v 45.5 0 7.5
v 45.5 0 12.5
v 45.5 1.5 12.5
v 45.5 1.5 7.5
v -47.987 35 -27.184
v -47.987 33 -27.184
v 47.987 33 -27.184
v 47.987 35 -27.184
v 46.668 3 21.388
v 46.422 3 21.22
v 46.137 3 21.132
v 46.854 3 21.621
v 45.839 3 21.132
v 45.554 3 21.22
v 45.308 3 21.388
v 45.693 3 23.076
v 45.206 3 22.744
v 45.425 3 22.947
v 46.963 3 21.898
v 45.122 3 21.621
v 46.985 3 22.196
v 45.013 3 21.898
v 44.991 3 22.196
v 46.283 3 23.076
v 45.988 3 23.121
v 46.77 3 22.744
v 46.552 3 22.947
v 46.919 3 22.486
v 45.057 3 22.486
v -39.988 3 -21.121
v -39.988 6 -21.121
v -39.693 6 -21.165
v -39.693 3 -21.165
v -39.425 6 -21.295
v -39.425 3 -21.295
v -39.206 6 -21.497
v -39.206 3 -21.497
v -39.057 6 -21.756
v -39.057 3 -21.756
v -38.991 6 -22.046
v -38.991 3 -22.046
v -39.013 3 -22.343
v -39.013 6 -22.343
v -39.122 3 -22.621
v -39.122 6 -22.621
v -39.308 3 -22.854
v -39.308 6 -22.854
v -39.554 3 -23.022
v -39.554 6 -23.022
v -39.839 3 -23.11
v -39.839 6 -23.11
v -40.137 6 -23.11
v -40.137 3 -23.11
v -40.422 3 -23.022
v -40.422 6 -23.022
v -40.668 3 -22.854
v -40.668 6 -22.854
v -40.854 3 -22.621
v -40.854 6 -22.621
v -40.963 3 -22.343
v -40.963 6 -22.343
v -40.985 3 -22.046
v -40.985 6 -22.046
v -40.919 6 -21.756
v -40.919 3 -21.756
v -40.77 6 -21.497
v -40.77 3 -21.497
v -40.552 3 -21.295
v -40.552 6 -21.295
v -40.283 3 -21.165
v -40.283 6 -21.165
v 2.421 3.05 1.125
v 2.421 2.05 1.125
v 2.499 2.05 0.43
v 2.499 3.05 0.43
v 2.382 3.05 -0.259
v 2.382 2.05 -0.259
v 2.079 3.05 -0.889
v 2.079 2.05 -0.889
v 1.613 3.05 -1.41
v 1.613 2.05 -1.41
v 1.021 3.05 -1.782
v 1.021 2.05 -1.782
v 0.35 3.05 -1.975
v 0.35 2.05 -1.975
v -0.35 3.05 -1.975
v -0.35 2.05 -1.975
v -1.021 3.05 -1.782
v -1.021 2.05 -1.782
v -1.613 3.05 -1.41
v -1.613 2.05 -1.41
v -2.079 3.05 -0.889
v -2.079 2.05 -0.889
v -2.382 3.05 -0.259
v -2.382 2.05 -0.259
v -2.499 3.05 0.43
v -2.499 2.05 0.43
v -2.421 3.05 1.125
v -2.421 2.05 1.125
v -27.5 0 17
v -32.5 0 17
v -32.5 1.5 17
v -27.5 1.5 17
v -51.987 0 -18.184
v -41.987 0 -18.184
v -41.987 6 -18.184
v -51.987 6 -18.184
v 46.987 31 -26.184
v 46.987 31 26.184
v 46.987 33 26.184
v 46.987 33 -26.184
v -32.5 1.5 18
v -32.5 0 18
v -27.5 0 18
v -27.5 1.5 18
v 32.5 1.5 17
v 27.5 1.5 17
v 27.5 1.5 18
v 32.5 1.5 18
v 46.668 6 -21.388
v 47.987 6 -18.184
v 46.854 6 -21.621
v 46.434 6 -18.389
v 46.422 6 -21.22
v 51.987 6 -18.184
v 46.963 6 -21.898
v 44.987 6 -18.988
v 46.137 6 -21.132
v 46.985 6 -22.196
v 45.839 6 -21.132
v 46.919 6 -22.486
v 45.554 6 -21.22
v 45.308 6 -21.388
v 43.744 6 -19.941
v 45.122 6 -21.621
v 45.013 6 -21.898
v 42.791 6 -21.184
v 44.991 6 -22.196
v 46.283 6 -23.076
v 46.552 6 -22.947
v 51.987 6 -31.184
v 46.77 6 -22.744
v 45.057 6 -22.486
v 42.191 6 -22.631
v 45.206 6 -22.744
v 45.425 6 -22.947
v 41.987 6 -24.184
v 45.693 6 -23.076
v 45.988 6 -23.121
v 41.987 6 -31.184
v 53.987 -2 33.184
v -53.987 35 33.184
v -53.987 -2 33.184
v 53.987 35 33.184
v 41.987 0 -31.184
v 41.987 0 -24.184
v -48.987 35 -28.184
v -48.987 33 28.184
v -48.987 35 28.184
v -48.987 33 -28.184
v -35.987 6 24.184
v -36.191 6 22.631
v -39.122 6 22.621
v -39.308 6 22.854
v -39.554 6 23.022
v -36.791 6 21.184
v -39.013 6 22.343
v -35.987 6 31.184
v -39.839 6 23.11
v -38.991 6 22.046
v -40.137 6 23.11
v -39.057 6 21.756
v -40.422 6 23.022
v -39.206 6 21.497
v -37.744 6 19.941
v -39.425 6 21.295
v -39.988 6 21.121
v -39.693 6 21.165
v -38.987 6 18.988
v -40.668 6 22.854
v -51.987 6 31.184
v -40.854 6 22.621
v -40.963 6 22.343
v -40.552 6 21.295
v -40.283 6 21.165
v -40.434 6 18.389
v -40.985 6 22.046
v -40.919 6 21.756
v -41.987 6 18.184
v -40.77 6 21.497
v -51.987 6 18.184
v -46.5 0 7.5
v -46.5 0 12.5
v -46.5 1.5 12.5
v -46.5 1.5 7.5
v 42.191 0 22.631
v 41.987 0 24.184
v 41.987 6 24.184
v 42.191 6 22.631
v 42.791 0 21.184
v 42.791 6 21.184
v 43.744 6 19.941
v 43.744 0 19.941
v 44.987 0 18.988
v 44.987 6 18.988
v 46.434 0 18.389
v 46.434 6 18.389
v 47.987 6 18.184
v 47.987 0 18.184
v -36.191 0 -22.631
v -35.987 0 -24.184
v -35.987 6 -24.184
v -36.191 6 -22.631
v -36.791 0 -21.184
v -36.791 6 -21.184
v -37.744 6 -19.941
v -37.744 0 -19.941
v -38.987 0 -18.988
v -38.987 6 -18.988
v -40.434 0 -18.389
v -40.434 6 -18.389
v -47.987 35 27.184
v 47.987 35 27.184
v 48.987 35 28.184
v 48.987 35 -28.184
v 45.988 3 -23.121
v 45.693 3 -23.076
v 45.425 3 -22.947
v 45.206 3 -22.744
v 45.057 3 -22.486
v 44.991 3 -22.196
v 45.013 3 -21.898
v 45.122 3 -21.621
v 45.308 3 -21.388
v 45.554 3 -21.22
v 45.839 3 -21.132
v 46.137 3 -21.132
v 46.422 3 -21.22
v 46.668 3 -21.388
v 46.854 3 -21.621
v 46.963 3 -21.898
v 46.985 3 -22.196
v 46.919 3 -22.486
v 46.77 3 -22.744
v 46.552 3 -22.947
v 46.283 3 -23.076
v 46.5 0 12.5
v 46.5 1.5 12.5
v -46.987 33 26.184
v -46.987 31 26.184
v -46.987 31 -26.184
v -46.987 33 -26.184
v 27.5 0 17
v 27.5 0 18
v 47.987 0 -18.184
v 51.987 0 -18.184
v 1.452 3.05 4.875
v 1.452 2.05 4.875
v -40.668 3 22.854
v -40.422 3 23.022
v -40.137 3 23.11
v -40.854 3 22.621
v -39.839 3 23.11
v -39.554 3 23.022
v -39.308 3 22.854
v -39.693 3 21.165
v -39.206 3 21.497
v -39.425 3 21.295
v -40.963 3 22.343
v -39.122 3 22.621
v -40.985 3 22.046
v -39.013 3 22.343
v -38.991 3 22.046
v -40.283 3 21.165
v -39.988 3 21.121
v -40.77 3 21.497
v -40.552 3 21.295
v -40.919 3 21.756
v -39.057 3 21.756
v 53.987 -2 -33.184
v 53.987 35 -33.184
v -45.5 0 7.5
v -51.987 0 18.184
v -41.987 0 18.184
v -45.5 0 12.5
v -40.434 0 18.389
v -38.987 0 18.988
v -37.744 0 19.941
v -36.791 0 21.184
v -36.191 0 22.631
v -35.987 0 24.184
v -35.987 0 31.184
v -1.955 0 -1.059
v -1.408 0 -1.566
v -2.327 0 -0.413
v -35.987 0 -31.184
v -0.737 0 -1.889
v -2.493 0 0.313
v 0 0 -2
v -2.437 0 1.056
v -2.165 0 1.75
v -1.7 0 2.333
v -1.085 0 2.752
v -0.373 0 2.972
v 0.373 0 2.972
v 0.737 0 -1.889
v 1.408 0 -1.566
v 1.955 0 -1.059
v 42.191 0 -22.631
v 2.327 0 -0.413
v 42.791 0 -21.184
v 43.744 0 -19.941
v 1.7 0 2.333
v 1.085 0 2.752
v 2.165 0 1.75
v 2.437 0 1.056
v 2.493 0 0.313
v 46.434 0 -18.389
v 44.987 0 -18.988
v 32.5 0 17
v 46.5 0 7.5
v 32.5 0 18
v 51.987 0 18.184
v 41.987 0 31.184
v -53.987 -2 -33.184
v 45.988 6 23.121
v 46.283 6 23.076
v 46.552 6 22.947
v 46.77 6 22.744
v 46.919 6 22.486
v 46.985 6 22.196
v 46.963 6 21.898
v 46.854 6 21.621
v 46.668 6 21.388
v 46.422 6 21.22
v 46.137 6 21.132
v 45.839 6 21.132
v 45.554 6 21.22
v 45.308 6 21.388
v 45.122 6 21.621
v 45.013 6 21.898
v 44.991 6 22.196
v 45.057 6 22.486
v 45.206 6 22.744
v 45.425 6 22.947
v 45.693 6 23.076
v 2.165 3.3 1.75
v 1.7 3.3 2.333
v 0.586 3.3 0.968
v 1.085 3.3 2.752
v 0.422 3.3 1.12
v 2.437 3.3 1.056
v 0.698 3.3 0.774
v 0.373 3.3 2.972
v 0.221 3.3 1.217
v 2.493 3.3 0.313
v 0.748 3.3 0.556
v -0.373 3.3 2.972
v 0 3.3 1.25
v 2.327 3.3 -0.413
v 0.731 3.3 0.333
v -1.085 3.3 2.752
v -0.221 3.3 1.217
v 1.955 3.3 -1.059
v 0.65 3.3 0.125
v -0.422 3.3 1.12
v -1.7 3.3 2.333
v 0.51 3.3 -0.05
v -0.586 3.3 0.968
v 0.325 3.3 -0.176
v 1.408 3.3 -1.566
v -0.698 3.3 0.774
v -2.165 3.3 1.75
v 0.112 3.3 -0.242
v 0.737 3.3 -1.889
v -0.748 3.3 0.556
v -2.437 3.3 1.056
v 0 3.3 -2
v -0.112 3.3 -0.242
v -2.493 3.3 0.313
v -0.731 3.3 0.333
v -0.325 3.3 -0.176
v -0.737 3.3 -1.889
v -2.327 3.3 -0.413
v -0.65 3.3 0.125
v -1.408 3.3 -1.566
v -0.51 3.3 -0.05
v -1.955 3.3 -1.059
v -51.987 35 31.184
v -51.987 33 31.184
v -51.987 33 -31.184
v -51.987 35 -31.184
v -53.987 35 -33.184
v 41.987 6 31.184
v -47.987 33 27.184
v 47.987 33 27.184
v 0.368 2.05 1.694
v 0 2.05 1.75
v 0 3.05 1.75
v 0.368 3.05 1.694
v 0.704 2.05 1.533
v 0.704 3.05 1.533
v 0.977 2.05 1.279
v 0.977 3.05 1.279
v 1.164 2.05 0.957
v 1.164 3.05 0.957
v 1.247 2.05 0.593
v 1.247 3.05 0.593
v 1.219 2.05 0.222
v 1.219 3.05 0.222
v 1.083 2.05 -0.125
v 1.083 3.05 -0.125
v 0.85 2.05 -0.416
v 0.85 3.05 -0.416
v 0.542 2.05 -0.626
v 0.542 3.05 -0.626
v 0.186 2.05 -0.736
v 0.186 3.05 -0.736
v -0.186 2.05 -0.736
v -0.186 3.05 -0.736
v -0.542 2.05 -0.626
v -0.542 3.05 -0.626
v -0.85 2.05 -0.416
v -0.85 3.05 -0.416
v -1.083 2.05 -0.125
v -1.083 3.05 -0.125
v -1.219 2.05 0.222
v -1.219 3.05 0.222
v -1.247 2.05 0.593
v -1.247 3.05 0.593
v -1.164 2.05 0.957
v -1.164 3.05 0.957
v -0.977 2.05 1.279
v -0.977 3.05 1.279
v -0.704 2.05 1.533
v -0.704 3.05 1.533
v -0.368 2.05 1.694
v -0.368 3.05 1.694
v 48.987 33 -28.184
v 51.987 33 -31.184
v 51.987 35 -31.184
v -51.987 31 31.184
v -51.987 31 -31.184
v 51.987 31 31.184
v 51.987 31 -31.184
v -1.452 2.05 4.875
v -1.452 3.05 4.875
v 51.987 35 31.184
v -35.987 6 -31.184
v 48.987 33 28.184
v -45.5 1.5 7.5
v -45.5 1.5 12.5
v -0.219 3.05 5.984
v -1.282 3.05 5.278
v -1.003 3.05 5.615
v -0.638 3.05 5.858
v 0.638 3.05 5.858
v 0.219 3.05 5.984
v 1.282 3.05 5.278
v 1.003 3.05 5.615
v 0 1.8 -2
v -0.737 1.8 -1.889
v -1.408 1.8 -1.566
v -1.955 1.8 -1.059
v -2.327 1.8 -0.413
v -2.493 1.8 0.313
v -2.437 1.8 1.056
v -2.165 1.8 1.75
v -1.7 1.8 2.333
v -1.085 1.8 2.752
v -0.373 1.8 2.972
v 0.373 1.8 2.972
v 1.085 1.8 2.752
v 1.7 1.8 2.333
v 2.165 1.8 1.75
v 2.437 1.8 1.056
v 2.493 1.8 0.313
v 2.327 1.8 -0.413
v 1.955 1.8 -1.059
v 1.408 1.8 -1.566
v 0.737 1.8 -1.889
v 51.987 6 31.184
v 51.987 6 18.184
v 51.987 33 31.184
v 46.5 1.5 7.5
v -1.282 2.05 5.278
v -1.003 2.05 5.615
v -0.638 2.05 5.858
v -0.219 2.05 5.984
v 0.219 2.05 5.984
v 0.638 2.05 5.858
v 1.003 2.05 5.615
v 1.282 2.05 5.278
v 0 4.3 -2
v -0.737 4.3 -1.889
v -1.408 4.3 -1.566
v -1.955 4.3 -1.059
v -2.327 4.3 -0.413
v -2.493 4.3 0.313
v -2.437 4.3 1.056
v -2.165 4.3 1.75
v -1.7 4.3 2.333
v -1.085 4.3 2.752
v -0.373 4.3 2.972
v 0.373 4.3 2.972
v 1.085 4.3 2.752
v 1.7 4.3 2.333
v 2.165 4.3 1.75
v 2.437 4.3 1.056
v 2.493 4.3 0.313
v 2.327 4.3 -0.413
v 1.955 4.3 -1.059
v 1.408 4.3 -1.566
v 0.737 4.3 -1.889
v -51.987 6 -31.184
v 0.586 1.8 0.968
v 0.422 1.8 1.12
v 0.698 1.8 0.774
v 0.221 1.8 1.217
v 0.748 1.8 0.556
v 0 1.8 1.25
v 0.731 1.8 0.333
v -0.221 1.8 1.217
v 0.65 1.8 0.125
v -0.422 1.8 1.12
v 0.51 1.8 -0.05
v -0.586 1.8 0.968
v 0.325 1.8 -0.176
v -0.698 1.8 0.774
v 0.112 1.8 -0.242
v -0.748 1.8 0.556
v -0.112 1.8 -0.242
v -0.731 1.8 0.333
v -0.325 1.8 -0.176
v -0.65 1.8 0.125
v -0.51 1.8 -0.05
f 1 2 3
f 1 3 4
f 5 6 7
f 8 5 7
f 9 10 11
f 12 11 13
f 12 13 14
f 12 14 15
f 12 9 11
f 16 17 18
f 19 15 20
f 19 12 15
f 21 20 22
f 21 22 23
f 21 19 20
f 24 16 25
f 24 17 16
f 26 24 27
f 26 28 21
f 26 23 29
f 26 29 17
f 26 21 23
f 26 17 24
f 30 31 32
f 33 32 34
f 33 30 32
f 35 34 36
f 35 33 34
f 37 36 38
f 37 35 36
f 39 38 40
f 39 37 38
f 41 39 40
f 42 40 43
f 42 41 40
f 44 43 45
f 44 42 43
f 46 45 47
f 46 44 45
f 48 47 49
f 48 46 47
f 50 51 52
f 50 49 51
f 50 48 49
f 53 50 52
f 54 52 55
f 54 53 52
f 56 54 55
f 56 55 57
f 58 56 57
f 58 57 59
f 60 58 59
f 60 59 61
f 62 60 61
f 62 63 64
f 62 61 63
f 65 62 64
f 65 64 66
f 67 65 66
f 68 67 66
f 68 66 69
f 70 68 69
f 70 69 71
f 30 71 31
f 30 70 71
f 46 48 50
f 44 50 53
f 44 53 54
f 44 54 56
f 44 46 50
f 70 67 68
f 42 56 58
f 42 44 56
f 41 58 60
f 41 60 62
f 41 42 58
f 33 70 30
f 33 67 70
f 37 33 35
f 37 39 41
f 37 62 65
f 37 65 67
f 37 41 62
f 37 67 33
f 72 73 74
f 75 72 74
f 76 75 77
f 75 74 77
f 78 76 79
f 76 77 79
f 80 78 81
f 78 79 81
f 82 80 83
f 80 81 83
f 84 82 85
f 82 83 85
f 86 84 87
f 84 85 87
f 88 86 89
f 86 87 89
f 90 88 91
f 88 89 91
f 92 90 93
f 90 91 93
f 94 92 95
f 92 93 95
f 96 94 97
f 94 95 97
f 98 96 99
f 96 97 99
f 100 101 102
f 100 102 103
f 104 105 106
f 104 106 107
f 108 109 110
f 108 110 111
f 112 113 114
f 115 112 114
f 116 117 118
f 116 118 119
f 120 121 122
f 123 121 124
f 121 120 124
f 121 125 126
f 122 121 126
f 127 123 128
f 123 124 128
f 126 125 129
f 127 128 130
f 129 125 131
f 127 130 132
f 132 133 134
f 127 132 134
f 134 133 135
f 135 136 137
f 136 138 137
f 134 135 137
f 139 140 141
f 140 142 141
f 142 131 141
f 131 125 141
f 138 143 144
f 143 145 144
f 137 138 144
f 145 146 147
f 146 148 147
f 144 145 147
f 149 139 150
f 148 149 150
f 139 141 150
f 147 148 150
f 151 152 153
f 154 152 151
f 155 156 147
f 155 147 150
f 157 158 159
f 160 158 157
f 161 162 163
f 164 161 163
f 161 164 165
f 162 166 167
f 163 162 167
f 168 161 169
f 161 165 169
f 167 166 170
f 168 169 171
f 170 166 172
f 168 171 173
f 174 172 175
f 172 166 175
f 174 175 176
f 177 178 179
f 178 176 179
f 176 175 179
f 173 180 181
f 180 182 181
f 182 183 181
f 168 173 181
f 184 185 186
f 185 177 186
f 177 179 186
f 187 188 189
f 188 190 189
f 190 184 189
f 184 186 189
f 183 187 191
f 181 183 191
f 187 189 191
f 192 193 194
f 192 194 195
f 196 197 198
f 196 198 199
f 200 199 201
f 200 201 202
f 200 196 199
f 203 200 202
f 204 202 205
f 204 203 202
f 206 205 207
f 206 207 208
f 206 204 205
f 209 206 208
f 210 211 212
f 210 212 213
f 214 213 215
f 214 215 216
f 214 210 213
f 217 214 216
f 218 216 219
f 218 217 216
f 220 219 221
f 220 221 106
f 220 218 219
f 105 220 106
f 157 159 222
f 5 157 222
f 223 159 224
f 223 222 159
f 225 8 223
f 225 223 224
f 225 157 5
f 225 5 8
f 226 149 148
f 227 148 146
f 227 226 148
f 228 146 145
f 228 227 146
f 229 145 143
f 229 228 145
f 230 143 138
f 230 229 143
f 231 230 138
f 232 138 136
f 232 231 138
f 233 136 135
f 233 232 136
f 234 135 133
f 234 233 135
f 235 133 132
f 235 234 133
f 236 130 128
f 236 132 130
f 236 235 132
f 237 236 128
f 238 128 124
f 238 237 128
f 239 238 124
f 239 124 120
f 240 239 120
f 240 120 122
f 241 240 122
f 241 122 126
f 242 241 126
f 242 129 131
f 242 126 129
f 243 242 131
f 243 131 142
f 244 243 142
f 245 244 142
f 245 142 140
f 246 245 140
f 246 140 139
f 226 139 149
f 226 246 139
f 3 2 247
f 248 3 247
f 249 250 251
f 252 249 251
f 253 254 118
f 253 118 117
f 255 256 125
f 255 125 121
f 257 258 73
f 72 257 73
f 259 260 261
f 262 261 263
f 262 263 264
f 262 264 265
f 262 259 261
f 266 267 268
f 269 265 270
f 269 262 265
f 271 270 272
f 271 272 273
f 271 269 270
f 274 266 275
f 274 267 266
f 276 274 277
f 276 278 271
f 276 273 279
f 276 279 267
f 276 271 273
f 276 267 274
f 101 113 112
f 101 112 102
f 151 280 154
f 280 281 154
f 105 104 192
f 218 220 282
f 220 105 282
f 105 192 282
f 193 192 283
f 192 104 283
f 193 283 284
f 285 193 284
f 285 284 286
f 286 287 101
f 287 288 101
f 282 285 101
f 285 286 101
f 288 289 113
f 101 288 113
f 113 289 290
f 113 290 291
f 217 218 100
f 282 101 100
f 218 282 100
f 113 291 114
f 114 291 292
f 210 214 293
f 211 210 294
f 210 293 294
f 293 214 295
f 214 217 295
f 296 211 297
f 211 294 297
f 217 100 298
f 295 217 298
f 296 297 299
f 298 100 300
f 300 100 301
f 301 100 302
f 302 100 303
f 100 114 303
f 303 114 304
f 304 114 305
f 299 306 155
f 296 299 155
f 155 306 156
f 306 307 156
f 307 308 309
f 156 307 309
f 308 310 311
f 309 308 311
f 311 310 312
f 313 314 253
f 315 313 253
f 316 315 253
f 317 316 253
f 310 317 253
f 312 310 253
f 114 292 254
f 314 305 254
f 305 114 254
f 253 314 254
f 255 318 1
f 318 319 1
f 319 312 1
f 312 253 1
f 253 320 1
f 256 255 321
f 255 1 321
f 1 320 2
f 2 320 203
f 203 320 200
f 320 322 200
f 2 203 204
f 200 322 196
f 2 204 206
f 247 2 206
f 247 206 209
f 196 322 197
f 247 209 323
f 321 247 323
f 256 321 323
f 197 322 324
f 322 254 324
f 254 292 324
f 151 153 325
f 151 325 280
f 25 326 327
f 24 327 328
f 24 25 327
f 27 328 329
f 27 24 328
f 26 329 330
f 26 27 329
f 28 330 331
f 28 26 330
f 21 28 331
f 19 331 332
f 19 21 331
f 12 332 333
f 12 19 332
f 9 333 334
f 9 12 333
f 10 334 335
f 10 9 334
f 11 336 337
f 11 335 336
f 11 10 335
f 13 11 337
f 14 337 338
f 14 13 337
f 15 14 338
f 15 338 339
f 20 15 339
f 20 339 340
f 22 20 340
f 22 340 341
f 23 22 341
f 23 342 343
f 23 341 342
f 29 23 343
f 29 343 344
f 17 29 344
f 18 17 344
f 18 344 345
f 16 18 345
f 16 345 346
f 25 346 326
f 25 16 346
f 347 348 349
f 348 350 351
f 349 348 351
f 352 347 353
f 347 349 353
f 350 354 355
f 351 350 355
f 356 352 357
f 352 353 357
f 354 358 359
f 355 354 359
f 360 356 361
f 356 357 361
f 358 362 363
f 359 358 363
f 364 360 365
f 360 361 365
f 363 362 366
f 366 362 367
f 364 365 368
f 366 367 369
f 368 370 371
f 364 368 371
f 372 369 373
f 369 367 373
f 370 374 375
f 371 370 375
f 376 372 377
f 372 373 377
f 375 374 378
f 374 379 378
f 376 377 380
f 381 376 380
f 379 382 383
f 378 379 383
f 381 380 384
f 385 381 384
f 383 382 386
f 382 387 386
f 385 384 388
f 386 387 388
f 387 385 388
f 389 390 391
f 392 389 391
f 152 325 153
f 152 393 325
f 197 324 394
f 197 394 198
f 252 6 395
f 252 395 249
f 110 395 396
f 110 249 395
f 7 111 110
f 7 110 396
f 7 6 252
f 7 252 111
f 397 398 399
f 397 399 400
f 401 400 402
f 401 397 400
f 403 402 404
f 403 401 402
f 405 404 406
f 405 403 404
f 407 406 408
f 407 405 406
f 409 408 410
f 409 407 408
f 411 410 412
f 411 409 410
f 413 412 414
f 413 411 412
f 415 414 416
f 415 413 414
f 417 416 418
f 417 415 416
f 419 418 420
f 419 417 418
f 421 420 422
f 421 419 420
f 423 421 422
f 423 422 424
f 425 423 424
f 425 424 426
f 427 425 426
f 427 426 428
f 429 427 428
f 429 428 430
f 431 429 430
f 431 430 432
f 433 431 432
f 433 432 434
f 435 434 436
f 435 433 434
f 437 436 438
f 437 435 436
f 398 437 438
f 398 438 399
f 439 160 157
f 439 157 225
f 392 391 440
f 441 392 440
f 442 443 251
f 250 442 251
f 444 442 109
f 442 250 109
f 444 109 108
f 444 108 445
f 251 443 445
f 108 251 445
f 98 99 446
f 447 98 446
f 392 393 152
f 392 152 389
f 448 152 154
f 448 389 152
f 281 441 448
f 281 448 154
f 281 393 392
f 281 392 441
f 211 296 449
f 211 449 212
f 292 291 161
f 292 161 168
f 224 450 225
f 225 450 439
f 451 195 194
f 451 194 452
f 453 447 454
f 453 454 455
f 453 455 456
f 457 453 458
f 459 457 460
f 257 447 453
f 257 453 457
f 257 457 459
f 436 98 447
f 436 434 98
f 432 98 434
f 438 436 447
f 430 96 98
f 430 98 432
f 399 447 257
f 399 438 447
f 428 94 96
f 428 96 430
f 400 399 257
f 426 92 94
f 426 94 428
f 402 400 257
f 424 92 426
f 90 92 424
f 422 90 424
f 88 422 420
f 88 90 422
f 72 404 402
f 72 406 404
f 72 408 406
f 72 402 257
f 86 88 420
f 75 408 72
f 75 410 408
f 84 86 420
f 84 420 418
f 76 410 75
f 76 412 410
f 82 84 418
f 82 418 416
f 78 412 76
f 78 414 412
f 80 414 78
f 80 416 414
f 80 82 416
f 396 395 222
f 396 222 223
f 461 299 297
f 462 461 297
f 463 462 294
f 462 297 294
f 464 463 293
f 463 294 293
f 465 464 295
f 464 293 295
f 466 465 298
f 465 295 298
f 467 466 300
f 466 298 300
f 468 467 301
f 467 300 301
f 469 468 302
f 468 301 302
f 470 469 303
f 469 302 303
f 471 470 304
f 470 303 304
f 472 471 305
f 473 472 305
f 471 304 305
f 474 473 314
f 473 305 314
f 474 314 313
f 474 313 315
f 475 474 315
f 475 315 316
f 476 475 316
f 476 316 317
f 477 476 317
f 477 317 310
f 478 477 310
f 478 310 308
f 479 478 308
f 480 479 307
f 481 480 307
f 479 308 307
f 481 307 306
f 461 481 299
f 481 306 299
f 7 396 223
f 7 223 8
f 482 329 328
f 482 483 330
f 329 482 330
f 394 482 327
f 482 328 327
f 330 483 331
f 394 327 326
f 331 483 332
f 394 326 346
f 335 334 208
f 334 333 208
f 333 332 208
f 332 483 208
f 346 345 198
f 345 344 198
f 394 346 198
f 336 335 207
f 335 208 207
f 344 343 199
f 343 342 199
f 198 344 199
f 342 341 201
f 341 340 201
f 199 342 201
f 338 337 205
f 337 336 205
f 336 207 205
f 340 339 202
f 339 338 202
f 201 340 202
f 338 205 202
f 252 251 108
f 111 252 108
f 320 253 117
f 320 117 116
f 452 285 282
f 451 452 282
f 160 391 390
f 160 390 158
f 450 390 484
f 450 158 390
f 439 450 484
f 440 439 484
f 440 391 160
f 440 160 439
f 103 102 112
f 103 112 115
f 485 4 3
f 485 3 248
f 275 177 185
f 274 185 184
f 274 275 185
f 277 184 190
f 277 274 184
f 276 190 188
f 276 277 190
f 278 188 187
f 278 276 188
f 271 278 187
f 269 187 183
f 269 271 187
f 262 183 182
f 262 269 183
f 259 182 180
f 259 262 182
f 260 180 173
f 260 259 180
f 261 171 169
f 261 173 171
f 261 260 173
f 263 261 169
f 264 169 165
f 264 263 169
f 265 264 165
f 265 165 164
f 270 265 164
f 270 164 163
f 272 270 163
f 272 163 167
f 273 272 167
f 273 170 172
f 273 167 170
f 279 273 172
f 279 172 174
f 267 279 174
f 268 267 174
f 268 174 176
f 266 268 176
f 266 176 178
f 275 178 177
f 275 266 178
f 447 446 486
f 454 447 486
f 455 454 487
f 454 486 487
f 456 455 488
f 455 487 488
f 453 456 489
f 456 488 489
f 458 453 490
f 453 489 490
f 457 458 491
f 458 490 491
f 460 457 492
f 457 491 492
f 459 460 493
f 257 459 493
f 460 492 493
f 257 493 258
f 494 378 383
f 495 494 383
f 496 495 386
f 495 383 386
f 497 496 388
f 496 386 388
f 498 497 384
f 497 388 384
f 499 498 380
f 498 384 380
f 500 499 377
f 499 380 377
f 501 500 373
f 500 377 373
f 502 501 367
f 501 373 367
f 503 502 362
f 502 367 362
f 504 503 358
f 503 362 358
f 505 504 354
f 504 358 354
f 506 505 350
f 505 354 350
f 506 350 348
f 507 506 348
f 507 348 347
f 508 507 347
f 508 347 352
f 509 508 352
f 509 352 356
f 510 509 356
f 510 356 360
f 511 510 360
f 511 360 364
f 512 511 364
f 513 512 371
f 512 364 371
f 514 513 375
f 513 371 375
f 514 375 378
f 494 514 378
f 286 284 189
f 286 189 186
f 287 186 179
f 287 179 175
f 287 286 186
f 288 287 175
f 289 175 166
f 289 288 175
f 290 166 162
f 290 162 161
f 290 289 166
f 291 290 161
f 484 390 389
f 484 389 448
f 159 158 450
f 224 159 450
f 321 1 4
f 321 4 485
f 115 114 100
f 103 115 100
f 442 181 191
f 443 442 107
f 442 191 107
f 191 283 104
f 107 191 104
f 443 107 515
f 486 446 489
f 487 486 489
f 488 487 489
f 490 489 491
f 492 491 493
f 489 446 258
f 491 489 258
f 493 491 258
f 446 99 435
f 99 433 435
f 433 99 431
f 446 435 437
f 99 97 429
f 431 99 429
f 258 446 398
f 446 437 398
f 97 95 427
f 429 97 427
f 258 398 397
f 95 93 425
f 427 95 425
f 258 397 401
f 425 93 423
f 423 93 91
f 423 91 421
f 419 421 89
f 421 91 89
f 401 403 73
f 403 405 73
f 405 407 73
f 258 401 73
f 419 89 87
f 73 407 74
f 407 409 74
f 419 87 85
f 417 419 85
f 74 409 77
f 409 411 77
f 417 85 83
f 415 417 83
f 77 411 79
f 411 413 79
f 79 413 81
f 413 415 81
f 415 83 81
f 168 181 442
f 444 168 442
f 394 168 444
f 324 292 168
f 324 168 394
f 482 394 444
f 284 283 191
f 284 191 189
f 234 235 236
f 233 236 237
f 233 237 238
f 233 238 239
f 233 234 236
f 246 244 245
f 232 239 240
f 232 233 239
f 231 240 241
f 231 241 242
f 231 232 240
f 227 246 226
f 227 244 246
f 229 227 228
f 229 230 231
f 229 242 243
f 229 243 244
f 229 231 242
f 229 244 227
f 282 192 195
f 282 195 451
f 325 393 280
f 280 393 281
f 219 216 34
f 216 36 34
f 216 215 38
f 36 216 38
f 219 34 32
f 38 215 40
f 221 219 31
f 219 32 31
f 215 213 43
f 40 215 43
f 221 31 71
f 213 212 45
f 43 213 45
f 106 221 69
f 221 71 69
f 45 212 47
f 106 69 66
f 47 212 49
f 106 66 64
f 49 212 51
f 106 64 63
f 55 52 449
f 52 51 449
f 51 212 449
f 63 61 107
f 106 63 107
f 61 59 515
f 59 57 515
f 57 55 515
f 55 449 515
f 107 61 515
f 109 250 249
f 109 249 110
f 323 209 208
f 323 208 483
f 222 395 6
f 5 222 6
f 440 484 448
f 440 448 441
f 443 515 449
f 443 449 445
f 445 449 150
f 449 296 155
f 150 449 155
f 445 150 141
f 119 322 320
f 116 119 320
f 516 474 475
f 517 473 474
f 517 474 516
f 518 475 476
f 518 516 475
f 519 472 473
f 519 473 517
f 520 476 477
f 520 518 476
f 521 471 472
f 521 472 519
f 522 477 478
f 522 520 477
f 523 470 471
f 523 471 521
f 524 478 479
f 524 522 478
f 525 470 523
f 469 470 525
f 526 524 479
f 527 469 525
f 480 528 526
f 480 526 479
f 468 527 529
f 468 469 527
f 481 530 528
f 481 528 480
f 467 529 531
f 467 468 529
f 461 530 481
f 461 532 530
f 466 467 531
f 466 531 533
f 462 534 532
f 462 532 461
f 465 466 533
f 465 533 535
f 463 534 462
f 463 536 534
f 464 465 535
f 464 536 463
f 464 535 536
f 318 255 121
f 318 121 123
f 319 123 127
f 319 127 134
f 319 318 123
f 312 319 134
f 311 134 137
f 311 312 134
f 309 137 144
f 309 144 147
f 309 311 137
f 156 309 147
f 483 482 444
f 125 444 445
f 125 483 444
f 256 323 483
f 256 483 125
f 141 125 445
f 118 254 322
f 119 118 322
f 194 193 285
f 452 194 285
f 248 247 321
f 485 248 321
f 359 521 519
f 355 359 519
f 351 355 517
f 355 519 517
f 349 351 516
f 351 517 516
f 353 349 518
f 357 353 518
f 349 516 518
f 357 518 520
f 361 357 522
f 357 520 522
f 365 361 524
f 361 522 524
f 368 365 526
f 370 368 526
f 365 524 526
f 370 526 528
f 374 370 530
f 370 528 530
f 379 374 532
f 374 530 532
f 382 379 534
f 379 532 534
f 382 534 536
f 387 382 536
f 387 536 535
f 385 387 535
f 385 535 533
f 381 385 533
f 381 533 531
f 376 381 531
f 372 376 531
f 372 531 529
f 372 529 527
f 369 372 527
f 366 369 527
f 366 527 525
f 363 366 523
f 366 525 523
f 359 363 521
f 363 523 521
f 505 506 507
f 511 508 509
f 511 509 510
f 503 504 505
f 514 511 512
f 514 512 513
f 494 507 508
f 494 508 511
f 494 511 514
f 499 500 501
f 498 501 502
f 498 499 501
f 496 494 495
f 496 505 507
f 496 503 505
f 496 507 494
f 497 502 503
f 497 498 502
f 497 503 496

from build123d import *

# Parameters (mm, degrees)
SKETCH1_W            = 107.9734
SKETCH1_H            = 66.3682
SKETCH1_W_2          = 103.9734
SKETCH1_H_2          = 62.3682
BOSS_EXTRUDE1_DEPTH  = 35
SKETCH2_W            = 107.9734
SKETCH2_H            = 66.3682
BOSS_EXTRUDE2_DEPTH  = 2
BOSS_EXTRUDE3_DEPTH  = 6
CUT_EXTRUDE1_REACH   = 77.393
CUT_EXTRUDE1_START   = 3
SKETCH4_R            = 1
SKETCH5_W            = 103.9734
SKETCH5_H            = 62.3682
SKETCH5_W_2          = 93.9734
SKETCH5_H_2          = 52.3682
BOSS_EXTRUDE4_DEPTH  = 2
SKETCH6_W            = 97.9734
SKETCH6_H            = 56.3682
SKETCH6_W_2          = 95.9734
SKETCH6_H_2          = 54.3682
BOSS_EXTRUDE5_DEPTH  = 2
SKETCH8_W            = 1
SKETCH8_H            = 5
SKETCH8_W_2          = 5
SKETCH8_H_2          = 1
BOSS_EXTRUDE6_DEPTH  = 1.5
SKETCH9_R            = 2.5
BOSS_EXTRUDE7_DEPTH  = 1.8
SKETCH12_R           = 0.75
BOSS_EXTRUDE8_DEPTH  = 1.5
BOSS_EXTRUDE9_START  = 0.25
SKETCH13_R           = 1.25
BOSS_EXTRUDE9_DEPTH  = 1
SKETCH14_R           = 2.5
BOSS_EXTRUDE10_DEPTH = 1


with BuildPart() as part:
    # Sketch1 → Boss-Extrude1 (new body)
    with BuildSketch(Plane(origin=(0, 0, 0), x_dir=(1, 0, 0), z_dir=(0, 1, 0))):
        Rectangle(SKETCH1_W, SKETCH1_H)
        Rectangle(SKETCH1_W_2, SKETCH1_H_2, mode=Mode.SUBTRACT)
    extrude(amount=BOSS_EXTRUDE1_DEPTH)

    # Sketch2 → Boss-Extrude2 (add)
    with BuildSketch(Plane.XZ):
        Rectangle(SKETCH2_W, SKETCH2_H)
    extrude(amount=BOSS_EXTRUDE2_DEPTH)

    # Sketch3 → Boss-Extrude3 (add)
    with BuildSketch(Plane(origin=(0, 0, 0), x_dir=(1, 0, 0), z_dir=(0, 1, 0))):
        with BuildLine():
            Line((-51.9867, 18.1841), (-51.9867, 31.1841))
            Line((-51.9867, 31.1841), (-35.9867, 31.1841))
            Line((-35.9867, 31.1841), (-35.9867, 24.1841))
            ThreePointArc((-35.9867, 24.1841), (-37.744059313, 19.941459313), (-41.9867, 18.1841))
            Line((-41.9867, 18.1841), (-51.9867, 18.1841))
        make_face()
        with BuildLine():
            Line((51.9867, 18.1841), (47.9867, 18.1841))
            ThreePointArc((47.9867, 18.1841), (43.744059313, 19.941459313), (41.9867, 24.1841))
            Line((41.9867, 24.1841), (41.9867, 31.1841))
            Line((41.9867, 31.1841), (51.9867, 31.1841))
            Line((51.9867, 31.1841), (51.9867, 18.1841))
        make_face()
        with BuildLine():
            Line((41.9867, -31.1841), (41.9867, -24.1841))
            ThreePointArc((41.9867, -24.1841), (43.744059313, -19.941459313), (47.9867, -18.1841))
            Line((47.9867, -18.1841), (51.9867, -18.1841))
            Line((51.9867, -18.1841), (51.9867, -31.1841))
            Line((51.9867, -31.1841), (41.9867, -31.1841))
        make_face()
        with BuildLine():
            Line((-51.9867, -18.1841), (-41.9867, -18.1841))
            ThreePointArc((-41.9867, -18.1841), (-37.744059313, -19.941459313), (-35.9867, -24.1841))
            Line((-35.9867, -24.1841), (-35.9867, -31.1841))
            Line((-35.9867, -31.1841), (-51.9867, -31.1841))
            Line((-51.9867, -31.1841), (-51.9867, -18.1841))
        make_face()
    extrude(amount=BOSS_EXTRUDE3_DEPTH)

    # Sketch4 → Cut-Extrude1 (cut, up to next)
    with BuildSketch(Plane(origin=(0, 0, 0), x_dir=(1, 0, 0), z_dir=(0, 1, 0)).offset(CUT_EXTRUDE1_START), mode=Mode.PRIVATE) as cut_extrude1_sk1:
        with Locations(Location((-39.98825, 22.12085, 0), (0, 0, 270))):
            Circle(SKETCH4_R)
    cut_extrude1_tool1 = extrude(cut_extrude1_sk1.sketch, amount=CUT_EXTRUDE1_REACH, mode=Mode.PRIVATE) & part.part
    # Sketch4 → Cut-Extrude1 (cut, up to next)
    with BuildSketch(Plane(origin=(0, 0, 0), x_dir=(1, 0, 0), z_dir=(0, 1, 0)).offset(CUT_EXTRUDE1_START), mode=Mode.PRIVATE) as cut_extrude1_sk2:
        with Locations(Location((45.98825, 22.12085, 0), (0, 0, 90))):
            Circle(SKETCH4_R)
    cut_extrude1_tool2 = extrude(cut_extrude1_sk2.sketch, amount=CUT_EXTRUDE1_REACH, mode=Mode.PRIVATE) & part.part
    # Sketch4 → Cut-Extrude1 (cut, up to next)
    with BuildSketch(Plane(origin=(0, 0, 0), x_dir=(1, 0, 0), z_dir=(0, 1, 0)).offset(CUT_EXTRUDE1_START), mode=Mode.PRIVATE) as cut_extrude1_sk3:
        with Locations(Location((45.98825, -22.12085, 0), (0, 0, 270))):
            Circle(SKETCH4_R)
    cut_extrude1_tool3 = extrude(cut_extrude1_sk3.sketch, amount=CUT_EXTRUDE1_REACH, mode=Mode.PRIVATE) & part.part
    # Sketch4 → Cut-Extrude1 (cut, up to next)
    with BuildSketch(Plane(origin=(0, 0, 0), x_dir=(1, 0, 0), z_dir=(0, 1, 0)).offset(CUT_EXTRUDE1_START), mode=Mode.PRIVATE) as cut_extrude1_sk4:
        with Locations(Location((-39.98825, -22.12085, 0), (0, 0, 90))):
            Circle(SKETCH4_R)
    cut_extrude1_tool4 = extrude(cut_extrude1_sk4.sketch, amount=CUT_EXTRUDE1_REACH, mode=Mode.PRIVATE) & part.part
    add(cut_extrude1_tool1.solids().sort_by_distance((-39.98825, 3, -22.12085))[0], mode=Mode.SUBTRACT)
    add(cut_extrude1_tool2.solids().sort_by_distance((45.98825, 3, -22.12085))[0], mode=Mode.SUBTRACT)
    add(cut_extrude1_tool3.solids().sort_by_distance((45.98825, 3, 22.12085))[0], mode=Mode.SUBTRACT)
    add(cut_extrude1_tool4.solids().sort_by_distance((-39.98825, 3, 22.12085))[0], mode=Mode.SUBTRACT)

    # Sketch5 → Boss-Extrude4 (add)
    with BuildSketch(Plane(origin=(0, 31, 0), x_dir=(1, 0, 0), z_dir=(0, 1, 0))):
        Rectangle(SKETCH5_W, SKETCH5_H)
        Rectangle(SKETCH5_W_2, SKETCH5_H_2, mode=Mode.SUBTRACT)
    extrude(amount=BOSS_EXTRUDE4_DEPTH)

    # Sketch6 → Boss-Extrude5 (add)
    with BuildSketch(Plane(origin=(0, 33, 0), x_dir=(1, 0, 0), z_dir=(0, 1, 0))):
        Rectangle(SKETCH6_W, SKETCH6_H)
        Rectangle(SKETCH6_W_2, SKETCH6_H_2, mode=Mode.SUBTRACT)
    extrude(amount=BOSS_EXTRUDE5_DEPTH)

    # Sketch8 → Boss-Extrude6 (add)
    with BuildSketch(Plane(origin=(0, 0, 0), x_dir=(1, 0, 0), z_dir=(0, 1, 0))):
        with Locations((-46, -10)):
            Rectangle(SKETCH8_W, SKETCH8_H)
        with Locations((46, -10)):
            Rectangle(SKETCH8_W, SKETCH8_H)
        with Locations((-30, -17.5)):
            Rectangle(SKETCH8_W_2, SKETCH8_H_2)
        with Locations((30, -17.5)):
            Rectangle(SKETCH8_W_2, SKETCH8_H_2)
    extrude(amount=BOSS_EXTRUDE6_DEPTH)

    # Sketch9 → Boss-Extrude7 (add)
    with BuildSketch(Plane(origin=(0, 0, 0), x_dir=(1, 0, 0), z_dir=(0, 1, 0))):
        with Locations(Location((0, -0.5, 0), (0, 0, 90))):
            Circle(SKETCH9_R)
    extrude(amount=BOSS_EXTRUDE7_DEPTH)

    # Sketch12 → Boss-Extrude8 (add)
    with BuildSketch(Plane(origin=(0, 1.8, 0), x_dir=(1, 0, 0), z_dir=(0, 1, 0))):
        with Locations(Location((0, -0.5, 0), (0, 0, 270))):
            Circle(SKETCH12_R)
    extrude(amount=BOSS_EXTRUDE8_DEPTH)

    # Sketch14 → Boss-Extrude10 (add)
    with BuildSketch(Plane(origin=(0, 3.3, 0), x_dir=(1, 0, 0), z_dir=(0, 1, 0))):
        with Locations(Location((0, -0.5, 0), (0, 0, 90))):
            Circle(SKETCH14_R)
    extrude(amount=BOSS_EXTRUDE10_DEPTH)


with BuildPart() as body_2:
    # Sketch13 → Boss-Extrude9 (new body)
    with BuildSketch(Plane(origin=(0, 1.8, 0), x_dir=(1, 0, 0), z_dir=(0, 1, 0)).offset(BOSS_EXTRUDE9_START)):
        with BuildLine():
            Line((-2.420614591, -1.125), (-1.452368755, -4.875))
            ThreePointArc((-1.452368755, -4.875), (0, -6), (1.452368755, -4.875))
            Line((1.452368755, -4.875), (2.420614591, -1.125))
            ThreePointArc((2.420614591, -1.125), (0, 2), (-2.420614591, -1.125))
        make_face()
        with Locations(Location((0, -0.5, 0), (0, 0, 270))):
            Circle(SKETCH13_R, mode=Mode.SUBTRACT)
    extrude(amount=BOSS_EXTRUDE9_DEPTH)


solid = Compound([part.part, body_2.part])
